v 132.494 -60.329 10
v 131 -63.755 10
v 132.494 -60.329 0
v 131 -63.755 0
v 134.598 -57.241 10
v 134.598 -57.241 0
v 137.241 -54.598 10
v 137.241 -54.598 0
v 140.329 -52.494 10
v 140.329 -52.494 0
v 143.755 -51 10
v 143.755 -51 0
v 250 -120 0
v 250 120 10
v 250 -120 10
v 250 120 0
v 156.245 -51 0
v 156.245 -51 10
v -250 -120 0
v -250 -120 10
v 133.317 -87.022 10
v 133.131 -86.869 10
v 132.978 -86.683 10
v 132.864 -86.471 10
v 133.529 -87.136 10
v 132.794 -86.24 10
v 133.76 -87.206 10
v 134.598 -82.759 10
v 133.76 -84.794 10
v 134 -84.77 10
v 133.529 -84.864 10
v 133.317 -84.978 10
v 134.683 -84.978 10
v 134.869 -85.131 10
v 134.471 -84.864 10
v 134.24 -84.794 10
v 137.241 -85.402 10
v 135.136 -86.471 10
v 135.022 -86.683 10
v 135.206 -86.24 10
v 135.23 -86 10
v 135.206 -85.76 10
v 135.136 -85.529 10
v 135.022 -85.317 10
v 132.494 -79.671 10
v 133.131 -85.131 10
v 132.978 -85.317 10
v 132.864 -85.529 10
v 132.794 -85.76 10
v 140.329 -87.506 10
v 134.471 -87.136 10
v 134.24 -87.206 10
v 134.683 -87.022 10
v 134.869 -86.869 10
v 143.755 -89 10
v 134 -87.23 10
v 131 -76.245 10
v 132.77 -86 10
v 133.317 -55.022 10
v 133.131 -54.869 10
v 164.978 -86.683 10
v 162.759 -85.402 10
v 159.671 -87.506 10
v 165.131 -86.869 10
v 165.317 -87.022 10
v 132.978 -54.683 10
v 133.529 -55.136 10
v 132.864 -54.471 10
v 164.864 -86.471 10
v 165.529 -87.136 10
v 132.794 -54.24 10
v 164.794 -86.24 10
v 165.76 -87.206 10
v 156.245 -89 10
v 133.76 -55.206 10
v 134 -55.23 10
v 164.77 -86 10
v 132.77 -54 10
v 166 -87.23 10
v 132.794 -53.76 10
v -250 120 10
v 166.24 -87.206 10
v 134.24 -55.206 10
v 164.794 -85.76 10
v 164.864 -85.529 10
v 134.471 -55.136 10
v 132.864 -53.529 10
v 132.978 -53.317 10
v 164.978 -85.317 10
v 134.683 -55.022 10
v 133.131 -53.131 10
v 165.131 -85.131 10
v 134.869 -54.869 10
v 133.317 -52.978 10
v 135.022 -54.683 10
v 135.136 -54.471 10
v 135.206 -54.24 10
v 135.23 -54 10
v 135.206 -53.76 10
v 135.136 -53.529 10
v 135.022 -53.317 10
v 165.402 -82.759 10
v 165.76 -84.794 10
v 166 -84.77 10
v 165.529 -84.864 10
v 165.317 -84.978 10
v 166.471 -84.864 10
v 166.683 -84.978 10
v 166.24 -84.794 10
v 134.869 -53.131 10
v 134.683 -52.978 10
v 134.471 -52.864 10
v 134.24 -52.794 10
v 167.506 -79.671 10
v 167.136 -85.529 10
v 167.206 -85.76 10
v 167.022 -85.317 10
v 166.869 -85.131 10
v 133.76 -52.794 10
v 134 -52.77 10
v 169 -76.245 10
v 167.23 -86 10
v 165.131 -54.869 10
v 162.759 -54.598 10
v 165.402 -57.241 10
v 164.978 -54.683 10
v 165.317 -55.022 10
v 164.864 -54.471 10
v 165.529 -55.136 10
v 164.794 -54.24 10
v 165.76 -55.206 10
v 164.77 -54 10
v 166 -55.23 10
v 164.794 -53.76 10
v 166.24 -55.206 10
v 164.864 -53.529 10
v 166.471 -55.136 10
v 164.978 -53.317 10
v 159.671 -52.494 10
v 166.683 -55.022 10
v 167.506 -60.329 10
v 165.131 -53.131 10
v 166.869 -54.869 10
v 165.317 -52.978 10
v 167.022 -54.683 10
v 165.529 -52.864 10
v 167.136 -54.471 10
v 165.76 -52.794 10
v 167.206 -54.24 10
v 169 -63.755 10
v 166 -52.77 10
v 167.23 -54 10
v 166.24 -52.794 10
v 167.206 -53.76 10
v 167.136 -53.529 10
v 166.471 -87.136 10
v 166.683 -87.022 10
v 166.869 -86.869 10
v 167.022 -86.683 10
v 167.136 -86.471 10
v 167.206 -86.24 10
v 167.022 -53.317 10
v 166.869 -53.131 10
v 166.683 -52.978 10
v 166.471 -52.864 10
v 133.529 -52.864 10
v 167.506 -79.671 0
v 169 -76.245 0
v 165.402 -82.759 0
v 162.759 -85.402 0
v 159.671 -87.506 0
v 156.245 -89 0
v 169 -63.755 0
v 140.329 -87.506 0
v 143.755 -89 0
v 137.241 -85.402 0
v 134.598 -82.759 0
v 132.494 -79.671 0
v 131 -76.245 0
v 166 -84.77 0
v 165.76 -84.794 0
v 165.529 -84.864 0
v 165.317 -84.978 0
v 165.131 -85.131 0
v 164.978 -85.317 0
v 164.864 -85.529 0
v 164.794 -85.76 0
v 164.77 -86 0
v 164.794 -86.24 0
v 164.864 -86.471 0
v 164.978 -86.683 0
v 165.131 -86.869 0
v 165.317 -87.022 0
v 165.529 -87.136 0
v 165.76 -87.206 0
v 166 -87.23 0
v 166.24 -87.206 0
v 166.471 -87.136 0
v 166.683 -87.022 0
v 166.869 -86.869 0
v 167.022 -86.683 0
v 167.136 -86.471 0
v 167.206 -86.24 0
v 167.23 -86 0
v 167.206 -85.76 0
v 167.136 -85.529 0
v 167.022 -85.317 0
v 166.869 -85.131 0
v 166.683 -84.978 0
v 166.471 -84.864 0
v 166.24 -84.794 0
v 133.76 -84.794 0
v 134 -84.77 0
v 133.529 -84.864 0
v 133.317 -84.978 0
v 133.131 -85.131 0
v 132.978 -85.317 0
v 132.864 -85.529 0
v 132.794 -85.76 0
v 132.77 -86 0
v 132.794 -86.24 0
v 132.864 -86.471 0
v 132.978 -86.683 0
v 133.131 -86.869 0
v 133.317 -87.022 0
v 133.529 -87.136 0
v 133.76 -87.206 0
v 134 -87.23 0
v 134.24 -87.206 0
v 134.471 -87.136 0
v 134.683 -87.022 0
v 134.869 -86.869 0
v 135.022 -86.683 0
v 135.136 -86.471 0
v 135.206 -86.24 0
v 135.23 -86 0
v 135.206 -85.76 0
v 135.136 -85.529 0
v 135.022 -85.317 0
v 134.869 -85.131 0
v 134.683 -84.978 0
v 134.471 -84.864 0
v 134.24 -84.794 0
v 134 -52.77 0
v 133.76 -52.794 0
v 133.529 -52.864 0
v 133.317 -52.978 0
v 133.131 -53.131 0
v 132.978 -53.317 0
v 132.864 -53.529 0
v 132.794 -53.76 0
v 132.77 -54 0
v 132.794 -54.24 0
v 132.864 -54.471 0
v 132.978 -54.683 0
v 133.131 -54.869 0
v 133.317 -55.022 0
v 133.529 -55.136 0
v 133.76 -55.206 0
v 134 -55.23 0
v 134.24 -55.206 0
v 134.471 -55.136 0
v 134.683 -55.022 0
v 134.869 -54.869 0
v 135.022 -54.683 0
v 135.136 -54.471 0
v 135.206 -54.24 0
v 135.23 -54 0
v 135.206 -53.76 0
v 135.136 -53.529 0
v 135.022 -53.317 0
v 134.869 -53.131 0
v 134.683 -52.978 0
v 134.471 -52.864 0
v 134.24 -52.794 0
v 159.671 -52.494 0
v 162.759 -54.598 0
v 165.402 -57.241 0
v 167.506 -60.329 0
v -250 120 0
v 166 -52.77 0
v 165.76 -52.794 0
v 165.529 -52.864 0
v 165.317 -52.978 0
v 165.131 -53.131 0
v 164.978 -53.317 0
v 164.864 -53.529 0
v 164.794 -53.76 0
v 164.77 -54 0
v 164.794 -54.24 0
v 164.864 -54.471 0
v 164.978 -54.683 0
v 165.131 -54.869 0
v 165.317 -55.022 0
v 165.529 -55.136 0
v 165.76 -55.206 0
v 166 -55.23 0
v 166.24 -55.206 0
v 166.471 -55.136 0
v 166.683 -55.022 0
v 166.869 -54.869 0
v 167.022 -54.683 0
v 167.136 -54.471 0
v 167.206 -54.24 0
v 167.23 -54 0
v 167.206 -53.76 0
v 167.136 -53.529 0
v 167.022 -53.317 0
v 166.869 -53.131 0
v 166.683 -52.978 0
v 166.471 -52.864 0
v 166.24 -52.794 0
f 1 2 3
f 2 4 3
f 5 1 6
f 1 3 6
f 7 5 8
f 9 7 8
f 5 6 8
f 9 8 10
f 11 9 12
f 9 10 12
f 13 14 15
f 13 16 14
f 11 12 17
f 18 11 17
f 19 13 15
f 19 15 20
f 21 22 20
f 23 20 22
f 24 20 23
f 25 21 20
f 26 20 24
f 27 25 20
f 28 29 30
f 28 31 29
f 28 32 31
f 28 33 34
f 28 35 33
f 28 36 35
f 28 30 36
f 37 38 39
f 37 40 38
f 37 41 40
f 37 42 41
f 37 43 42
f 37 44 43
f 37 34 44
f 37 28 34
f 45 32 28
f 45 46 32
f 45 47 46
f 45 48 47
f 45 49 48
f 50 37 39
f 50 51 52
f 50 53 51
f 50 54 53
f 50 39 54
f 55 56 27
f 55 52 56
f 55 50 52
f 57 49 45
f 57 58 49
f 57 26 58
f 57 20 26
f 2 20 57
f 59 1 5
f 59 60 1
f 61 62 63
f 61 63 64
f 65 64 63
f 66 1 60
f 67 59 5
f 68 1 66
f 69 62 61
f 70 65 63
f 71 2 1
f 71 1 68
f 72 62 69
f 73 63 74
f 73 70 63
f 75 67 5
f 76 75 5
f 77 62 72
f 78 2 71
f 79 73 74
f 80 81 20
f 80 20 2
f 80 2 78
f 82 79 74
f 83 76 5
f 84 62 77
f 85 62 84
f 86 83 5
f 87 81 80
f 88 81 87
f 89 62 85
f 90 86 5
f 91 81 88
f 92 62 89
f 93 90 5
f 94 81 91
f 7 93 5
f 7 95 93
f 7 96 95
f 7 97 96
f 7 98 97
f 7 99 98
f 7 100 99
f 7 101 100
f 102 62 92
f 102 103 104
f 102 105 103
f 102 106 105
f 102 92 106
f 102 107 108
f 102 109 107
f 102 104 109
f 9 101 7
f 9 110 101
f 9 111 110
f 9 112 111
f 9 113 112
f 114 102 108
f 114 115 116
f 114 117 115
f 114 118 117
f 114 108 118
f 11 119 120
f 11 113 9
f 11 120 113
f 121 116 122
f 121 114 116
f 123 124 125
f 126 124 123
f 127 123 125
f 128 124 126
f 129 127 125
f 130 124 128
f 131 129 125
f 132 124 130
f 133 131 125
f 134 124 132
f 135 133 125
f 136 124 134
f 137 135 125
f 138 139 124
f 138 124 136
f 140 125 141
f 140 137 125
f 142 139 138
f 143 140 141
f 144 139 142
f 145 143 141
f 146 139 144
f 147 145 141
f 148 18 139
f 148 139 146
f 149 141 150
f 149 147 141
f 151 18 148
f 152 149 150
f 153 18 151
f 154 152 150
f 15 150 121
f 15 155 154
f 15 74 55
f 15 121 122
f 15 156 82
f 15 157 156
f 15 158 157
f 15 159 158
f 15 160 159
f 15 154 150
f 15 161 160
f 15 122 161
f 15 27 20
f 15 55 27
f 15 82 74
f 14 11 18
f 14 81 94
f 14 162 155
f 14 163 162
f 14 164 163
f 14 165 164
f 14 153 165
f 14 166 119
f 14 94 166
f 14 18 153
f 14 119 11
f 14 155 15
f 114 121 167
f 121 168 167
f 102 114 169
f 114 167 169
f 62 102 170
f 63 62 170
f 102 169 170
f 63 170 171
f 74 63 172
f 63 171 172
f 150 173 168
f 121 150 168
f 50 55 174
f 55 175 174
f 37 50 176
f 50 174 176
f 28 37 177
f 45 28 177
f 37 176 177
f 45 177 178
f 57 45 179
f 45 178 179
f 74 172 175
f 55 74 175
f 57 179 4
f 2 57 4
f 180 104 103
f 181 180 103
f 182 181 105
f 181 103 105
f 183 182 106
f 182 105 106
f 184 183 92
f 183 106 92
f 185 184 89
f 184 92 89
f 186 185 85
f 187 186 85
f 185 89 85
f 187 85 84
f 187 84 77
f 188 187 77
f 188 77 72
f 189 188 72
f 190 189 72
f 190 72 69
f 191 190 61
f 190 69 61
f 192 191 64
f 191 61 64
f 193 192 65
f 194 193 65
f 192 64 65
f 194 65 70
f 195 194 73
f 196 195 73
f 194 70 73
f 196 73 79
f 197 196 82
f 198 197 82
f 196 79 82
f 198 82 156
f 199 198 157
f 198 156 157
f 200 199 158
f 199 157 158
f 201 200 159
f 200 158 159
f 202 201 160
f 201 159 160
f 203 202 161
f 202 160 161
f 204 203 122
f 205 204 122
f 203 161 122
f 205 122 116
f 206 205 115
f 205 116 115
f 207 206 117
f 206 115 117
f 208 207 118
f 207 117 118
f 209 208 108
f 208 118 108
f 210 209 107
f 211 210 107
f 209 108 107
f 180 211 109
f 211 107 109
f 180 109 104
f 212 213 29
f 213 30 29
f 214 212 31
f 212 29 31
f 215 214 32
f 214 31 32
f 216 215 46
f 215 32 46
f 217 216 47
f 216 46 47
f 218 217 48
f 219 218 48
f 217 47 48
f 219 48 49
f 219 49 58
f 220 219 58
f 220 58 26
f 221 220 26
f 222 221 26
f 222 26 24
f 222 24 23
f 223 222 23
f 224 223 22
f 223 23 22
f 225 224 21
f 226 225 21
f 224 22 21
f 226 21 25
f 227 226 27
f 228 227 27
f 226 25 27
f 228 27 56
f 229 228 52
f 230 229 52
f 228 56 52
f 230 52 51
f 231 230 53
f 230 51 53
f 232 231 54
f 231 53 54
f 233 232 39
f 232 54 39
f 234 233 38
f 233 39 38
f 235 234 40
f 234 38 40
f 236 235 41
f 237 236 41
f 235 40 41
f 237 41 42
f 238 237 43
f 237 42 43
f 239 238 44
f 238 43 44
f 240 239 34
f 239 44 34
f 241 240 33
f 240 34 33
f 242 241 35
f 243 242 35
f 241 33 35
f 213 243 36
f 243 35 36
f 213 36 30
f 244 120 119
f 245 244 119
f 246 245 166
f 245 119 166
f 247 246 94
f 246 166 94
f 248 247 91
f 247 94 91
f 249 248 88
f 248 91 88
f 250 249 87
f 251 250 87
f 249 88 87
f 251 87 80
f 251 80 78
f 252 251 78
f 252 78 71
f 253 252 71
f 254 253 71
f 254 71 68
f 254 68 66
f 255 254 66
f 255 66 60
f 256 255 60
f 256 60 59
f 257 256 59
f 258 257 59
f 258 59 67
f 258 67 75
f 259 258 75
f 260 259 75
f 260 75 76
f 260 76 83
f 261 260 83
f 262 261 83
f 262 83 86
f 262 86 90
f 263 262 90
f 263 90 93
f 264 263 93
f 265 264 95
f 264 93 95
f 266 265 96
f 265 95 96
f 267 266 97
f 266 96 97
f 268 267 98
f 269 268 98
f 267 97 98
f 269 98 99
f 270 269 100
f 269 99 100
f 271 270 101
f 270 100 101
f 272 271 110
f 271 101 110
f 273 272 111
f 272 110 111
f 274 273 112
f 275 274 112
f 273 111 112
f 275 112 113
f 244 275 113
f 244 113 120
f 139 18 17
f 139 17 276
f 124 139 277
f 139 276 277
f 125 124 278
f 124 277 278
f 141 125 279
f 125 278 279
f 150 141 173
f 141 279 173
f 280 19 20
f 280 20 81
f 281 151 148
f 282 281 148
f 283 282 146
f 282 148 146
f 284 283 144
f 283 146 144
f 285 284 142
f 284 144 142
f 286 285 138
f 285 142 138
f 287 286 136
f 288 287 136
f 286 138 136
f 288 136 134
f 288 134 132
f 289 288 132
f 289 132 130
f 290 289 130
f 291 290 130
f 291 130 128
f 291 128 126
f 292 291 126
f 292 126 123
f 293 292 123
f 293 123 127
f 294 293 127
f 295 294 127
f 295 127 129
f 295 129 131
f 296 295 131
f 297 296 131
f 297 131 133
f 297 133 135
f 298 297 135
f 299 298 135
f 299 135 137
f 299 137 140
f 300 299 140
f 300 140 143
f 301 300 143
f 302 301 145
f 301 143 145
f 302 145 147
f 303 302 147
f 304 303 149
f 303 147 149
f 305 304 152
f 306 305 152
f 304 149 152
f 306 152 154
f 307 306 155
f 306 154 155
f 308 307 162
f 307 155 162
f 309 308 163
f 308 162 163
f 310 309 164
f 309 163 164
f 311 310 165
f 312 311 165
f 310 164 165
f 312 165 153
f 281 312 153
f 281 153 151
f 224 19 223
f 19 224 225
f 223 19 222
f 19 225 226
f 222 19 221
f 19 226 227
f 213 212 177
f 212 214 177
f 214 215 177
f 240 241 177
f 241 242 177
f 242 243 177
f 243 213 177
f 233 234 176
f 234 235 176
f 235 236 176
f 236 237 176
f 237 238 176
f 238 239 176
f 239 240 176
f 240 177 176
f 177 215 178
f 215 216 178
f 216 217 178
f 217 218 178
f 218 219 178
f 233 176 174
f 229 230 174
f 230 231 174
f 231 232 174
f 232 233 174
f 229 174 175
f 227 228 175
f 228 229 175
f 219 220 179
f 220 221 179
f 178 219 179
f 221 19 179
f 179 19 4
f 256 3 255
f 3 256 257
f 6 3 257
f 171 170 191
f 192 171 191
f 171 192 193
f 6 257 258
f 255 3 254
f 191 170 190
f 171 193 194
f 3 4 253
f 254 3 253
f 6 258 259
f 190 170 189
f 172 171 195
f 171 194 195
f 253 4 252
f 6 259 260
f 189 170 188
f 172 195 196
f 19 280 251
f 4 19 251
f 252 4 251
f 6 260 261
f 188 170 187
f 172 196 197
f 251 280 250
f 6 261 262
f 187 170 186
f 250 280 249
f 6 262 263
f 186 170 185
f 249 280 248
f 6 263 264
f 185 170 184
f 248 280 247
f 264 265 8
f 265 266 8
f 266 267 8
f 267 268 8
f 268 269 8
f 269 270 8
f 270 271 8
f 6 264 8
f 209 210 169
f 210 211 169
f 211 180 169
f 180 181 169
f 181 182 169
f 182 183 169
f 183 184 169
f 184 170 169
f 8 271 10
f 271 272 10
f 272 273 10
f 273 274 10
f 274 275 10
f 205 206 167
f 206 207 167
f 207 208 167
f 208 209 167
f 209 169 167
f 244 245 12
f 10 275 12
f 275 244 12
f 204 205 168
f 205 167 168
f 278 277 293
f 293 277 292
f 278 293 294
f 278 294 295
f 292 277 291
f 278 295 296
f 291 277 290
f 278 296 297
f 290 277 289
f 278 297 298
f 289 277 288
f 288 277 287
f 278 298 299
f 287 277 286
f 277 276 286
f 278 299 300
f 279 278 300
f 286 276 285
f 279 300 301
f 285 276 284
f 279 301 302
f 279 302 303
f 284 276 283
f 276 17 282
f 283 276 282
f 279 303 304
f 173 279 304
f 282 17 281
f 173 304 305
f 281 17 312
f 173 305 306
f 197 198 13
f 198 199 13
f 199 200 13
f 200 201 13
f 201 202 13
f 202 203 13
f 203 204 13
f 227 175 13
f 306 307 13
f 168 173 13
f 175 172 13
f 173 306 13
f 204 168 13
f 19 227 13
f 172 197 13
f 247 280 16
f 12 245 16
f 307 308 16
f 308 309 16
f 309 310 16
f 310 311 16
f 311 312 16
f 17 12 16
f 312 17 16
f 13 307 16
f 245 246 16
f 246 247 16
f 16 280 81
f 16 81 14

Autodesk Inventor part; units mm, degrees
ref_plane "YZ Plane" through (0, 0, 0) normal (1, 0, 0) x (0, 1, 0)
ref_plane "XZ Plane" through (0, 0, 0) normal (0, 1, 0) x (-1, 0, 0)
ref_plane "XY Plane" through (0, 0, 0) normal (0, 0, 1) x (1, 0, 0)
sketch "Skizze1" plane through (0, 0, 0) normal (0, 0, 1) x (1, 0, 0)
  line L0 (-250, 120) -> (250, 120)
  line L1 (250, 120) -> (250, -120)
  line L2 (250, -120) -> (-250, -120)
  line L3 (-250, -120) -> (-250, 120)
  line L4 (-250, 120) -> (250, -120) construction
  line L5 (250, 120) -> (-250, -120) construction
  point P0 (0, 0)
  dimension "d0" = 500
  dimension "d1" = 240
extrude "Extrusion1" add sketch "Skizze1" along normal blind 10
sketch "Skizze3" plane through (0, 0, 0) normal (0, 0, -1) x (-1, 0, 0)
  line L0 (-250, 120) -> (-250, -120) projected
  line L1 (-250, -120) -> (250, -120) projected
  line L2 (-156.245, -89) -> (-143.755, -89)
  line L3 (-131, -76.245) -> (-131, -63.755)
  line L4 (-143.755, -51) -> (-156.245, -51)
  line L5 (-169, -63.755) -> (-169, -76.245)
  line L6 (-156.245, -89) -> (-143.755, -51) construction
  line L7 (-131, -76.245) -> (-169, -63.755) construction
  arc A0 (-143.755, -89) -> (-131, -76.245) centre (-150, -70) ccw
  arc A1 (-169, -76.245) -> (-156.245, -89) centre (-150, -70) ccw
  arc A2 (-131, -63.755) -> (-143.755, -51) centre (-150, -70) ccw
  arc A3 (-156.245, -51) -> (-169, -63.755) centre (-150, -70) ccw
  point P0 (0, 0)
  dimension "d32" = 38
  dimension "d33" = 20
  dimension "d34" = 50
  dimension "d35" = 100
extrude "Extrusion3" cut sketch "Skizze3" against normal through all
sketch "Skizze4" plane through (0, 0, 0) normal (0, 0, -1) x (-1, 0, 0)
  arc A0 (-143.755, -89) -> (-131, -76.245) centre (-150, -70) ccw projected
  line L0 (-134, -86) -> (-166, -86)
  line L1 (-166, -86) -> (-166, -54)
  line L2 (-166, -54) -> (-134, -54)
  line L3 (-134, -54) -> (-134, -86)
  line L4 (-134, -86) -> (-166, -54) construction
  line L5 (-166, -86) -> (-134, -54) construction
  point P0 (0, 0)
  dimension "d38" = 32
  dimension "d39" = 32
hole "Bohrung3" at (134, -54, 0) at (134, -86, 0) at (166, -86, 0) at (166, -54, 0) direction (0, 0, 1) diameter 2.459 end through all thread size "M3x0.5" class "6H" standard "ISO Metric profile"
properties part number "Lid_TopPanel" material "Polycarbonat, klar"
